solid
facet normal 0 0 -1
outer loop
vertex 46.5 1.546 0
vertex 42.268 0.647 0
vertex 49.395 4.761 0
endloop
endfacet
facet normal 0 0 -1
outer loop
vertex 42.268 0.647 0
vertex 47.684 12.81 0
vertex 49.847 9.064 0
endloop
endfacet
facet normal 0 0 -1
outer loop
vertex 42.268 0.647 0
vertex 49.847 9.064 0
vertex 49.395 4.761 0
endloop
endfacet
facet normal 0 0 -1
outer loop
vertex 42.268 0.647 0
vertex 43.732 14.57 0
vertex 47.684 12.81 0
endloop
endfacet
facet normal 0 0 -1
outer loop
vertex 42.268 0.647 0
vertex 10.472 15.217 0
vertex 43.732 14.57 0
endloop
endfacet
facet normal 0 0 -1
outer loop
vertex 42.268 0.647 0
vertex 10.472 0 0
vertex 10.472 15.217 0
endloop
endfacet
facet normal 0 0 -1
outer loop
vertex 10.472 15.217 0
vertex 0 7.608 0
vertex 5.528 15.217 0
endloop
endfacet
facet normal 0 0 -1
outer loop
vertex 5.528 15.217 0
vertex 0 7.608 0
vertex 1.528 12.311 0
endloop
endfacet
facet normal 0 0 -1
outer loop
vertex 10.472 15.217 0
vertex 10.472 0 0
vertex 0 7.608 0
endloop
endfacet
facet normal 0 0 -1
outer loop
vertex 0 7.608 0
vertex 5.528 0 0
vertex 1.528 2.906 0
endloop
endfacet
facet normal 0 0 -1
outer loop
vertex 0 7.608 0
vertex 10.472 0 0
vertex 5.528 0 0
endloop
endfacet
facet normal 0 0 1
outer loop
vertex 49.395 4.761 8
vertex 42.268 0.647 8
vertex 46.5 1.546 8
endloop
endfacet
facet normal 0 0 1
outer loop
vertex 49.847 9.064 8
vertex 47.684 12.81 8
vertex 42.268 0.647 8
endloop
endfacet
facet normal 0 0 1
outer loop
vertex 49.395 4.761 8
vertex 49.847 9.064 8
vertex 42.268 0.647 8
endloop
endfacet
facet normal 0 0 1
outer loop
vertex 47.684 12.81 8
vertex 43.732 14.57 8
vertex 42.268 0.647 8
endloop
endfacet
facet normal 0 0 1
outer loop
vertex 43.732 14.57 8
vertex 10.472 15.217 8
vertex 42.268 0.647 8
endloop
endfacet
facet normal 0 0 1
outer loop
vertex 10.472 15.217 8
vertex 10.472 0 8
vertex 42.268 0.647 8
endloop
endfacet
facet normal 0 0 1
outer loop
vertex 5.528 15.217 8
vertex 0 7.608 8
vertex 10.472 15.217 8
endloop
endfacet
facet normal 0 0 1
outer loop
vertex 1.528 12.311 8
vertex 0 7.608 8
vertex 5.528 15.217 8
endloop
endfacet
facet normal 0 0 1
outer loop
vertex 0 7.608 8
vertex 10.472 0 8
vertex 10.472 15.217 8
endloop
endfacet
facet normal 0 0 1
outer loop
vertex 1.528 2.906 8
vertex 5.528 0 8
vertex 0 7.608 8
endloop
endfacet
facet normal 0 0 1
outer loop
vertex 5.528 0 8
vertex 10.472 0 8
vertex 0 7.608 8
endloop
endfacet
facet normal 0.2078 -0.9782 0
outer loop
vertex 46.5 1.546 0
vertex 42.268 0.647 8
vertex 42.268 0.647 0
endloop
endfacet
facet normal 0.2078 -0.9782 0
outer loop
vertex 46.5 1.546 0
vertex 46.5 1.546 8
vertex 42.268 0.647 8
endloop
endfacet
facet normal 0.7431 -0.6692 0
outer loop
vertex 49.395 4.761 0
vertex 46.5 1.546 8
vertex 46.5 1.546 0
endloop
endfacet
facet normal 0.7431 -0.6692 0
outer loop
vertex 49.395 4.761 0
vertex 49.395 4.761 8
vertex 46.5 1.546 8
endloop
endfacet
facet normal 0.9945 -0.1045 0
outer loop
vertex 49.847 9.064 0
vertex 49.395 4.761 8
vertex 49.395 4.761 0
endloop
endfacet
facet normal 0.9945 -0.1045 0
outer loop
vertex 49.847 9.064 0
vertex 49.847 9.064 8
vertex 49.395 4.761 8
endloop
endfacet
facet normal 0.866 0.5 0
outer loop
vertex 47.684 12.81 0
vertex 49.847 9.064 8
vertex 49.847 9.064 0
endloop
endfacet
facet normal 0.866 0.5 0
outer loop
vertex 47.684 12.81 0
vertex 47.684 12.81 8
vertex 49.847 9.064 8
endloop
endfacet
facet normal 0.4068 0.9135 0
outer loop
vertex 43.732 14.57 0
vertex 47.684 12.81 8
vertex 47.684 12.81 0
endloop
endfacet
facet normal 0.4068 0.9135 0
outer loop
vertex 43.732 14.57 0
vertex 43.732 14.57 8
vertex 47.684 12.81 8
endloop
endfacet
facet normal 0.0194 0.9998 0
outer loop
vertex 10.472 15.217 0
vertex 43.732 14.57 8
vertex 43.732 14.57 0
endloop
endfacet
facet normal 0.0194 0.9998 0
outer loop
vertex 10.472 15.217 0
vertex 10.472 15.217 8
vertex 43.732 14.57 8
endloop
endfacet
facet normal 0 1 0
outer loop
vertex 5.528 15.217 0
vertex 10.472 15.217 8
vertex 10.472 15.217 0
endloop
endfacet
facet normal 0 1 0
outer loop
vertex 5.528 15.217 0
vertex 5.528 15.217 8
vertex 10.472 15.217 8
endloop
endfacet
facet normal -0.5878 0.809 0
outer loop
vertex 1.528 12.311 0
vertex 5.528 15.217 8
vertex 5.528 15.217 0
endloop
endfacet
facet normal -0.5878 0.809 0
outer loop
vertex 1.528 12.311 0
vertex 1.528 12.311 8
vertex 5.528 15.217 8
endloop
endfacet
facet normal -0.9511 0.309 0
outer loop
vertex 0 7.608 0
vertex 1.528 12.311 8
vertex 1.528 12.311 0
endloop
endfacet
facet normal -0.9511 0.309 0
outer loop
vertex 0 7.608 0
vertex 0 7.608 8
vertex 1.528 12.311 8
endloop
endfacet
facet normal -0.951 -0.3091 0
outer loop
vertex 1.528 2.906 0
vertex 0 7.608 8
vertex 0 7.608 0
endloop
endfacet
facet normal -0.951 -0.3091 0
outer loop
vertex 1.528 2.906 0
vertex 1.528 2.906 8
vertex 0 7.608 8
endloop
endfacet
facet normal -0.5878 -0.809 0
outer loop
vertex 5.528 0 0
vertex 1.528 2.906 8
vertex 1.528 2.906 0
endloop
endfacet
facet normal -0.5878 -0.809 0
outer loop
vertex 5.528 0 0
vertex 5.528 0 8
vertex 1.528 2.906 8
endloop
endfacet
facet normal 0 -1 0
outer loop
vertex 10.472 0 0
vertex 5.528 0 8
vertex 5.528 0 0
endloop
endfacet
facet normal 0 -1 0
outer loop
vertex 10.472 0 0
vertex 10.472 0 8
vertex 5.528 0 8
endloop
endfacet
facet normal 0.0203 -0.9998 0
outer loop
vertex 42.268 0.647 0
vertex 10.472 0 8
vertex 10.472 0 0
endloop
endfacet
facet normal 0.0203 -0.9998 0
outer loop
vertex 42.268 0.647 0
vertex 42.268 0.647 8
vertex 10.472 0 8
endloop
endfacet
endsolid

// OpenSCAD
$fn = 32;

// ----------------------------------------------------------------------
// Lever arm: two bosses 16 and 14 mm, 35 mm between centres
// ----------------------------------------------------------------------

// --- parameters (mm) ---
profile_height = 8;       // extrusion height
profile_points = 13;      // points of the closed outline

profile = [[0, 7.608], [1.528, 2.906], [5.528, 0], [10.472, 0], [42.268, 0.647], [46.5, 1.546], [49.395, 4.761], [49.847, 9.064], [47.684, 12.81], [43.732, 14.57], [10.472, 15.217], [5.528, 15.217], [1.528, 12.311]];  // single closed polygon, 13 points, counter clockwise

// --- the one profile operation ---
linear_extrude(height = profile_height) polygon(points = profile);
